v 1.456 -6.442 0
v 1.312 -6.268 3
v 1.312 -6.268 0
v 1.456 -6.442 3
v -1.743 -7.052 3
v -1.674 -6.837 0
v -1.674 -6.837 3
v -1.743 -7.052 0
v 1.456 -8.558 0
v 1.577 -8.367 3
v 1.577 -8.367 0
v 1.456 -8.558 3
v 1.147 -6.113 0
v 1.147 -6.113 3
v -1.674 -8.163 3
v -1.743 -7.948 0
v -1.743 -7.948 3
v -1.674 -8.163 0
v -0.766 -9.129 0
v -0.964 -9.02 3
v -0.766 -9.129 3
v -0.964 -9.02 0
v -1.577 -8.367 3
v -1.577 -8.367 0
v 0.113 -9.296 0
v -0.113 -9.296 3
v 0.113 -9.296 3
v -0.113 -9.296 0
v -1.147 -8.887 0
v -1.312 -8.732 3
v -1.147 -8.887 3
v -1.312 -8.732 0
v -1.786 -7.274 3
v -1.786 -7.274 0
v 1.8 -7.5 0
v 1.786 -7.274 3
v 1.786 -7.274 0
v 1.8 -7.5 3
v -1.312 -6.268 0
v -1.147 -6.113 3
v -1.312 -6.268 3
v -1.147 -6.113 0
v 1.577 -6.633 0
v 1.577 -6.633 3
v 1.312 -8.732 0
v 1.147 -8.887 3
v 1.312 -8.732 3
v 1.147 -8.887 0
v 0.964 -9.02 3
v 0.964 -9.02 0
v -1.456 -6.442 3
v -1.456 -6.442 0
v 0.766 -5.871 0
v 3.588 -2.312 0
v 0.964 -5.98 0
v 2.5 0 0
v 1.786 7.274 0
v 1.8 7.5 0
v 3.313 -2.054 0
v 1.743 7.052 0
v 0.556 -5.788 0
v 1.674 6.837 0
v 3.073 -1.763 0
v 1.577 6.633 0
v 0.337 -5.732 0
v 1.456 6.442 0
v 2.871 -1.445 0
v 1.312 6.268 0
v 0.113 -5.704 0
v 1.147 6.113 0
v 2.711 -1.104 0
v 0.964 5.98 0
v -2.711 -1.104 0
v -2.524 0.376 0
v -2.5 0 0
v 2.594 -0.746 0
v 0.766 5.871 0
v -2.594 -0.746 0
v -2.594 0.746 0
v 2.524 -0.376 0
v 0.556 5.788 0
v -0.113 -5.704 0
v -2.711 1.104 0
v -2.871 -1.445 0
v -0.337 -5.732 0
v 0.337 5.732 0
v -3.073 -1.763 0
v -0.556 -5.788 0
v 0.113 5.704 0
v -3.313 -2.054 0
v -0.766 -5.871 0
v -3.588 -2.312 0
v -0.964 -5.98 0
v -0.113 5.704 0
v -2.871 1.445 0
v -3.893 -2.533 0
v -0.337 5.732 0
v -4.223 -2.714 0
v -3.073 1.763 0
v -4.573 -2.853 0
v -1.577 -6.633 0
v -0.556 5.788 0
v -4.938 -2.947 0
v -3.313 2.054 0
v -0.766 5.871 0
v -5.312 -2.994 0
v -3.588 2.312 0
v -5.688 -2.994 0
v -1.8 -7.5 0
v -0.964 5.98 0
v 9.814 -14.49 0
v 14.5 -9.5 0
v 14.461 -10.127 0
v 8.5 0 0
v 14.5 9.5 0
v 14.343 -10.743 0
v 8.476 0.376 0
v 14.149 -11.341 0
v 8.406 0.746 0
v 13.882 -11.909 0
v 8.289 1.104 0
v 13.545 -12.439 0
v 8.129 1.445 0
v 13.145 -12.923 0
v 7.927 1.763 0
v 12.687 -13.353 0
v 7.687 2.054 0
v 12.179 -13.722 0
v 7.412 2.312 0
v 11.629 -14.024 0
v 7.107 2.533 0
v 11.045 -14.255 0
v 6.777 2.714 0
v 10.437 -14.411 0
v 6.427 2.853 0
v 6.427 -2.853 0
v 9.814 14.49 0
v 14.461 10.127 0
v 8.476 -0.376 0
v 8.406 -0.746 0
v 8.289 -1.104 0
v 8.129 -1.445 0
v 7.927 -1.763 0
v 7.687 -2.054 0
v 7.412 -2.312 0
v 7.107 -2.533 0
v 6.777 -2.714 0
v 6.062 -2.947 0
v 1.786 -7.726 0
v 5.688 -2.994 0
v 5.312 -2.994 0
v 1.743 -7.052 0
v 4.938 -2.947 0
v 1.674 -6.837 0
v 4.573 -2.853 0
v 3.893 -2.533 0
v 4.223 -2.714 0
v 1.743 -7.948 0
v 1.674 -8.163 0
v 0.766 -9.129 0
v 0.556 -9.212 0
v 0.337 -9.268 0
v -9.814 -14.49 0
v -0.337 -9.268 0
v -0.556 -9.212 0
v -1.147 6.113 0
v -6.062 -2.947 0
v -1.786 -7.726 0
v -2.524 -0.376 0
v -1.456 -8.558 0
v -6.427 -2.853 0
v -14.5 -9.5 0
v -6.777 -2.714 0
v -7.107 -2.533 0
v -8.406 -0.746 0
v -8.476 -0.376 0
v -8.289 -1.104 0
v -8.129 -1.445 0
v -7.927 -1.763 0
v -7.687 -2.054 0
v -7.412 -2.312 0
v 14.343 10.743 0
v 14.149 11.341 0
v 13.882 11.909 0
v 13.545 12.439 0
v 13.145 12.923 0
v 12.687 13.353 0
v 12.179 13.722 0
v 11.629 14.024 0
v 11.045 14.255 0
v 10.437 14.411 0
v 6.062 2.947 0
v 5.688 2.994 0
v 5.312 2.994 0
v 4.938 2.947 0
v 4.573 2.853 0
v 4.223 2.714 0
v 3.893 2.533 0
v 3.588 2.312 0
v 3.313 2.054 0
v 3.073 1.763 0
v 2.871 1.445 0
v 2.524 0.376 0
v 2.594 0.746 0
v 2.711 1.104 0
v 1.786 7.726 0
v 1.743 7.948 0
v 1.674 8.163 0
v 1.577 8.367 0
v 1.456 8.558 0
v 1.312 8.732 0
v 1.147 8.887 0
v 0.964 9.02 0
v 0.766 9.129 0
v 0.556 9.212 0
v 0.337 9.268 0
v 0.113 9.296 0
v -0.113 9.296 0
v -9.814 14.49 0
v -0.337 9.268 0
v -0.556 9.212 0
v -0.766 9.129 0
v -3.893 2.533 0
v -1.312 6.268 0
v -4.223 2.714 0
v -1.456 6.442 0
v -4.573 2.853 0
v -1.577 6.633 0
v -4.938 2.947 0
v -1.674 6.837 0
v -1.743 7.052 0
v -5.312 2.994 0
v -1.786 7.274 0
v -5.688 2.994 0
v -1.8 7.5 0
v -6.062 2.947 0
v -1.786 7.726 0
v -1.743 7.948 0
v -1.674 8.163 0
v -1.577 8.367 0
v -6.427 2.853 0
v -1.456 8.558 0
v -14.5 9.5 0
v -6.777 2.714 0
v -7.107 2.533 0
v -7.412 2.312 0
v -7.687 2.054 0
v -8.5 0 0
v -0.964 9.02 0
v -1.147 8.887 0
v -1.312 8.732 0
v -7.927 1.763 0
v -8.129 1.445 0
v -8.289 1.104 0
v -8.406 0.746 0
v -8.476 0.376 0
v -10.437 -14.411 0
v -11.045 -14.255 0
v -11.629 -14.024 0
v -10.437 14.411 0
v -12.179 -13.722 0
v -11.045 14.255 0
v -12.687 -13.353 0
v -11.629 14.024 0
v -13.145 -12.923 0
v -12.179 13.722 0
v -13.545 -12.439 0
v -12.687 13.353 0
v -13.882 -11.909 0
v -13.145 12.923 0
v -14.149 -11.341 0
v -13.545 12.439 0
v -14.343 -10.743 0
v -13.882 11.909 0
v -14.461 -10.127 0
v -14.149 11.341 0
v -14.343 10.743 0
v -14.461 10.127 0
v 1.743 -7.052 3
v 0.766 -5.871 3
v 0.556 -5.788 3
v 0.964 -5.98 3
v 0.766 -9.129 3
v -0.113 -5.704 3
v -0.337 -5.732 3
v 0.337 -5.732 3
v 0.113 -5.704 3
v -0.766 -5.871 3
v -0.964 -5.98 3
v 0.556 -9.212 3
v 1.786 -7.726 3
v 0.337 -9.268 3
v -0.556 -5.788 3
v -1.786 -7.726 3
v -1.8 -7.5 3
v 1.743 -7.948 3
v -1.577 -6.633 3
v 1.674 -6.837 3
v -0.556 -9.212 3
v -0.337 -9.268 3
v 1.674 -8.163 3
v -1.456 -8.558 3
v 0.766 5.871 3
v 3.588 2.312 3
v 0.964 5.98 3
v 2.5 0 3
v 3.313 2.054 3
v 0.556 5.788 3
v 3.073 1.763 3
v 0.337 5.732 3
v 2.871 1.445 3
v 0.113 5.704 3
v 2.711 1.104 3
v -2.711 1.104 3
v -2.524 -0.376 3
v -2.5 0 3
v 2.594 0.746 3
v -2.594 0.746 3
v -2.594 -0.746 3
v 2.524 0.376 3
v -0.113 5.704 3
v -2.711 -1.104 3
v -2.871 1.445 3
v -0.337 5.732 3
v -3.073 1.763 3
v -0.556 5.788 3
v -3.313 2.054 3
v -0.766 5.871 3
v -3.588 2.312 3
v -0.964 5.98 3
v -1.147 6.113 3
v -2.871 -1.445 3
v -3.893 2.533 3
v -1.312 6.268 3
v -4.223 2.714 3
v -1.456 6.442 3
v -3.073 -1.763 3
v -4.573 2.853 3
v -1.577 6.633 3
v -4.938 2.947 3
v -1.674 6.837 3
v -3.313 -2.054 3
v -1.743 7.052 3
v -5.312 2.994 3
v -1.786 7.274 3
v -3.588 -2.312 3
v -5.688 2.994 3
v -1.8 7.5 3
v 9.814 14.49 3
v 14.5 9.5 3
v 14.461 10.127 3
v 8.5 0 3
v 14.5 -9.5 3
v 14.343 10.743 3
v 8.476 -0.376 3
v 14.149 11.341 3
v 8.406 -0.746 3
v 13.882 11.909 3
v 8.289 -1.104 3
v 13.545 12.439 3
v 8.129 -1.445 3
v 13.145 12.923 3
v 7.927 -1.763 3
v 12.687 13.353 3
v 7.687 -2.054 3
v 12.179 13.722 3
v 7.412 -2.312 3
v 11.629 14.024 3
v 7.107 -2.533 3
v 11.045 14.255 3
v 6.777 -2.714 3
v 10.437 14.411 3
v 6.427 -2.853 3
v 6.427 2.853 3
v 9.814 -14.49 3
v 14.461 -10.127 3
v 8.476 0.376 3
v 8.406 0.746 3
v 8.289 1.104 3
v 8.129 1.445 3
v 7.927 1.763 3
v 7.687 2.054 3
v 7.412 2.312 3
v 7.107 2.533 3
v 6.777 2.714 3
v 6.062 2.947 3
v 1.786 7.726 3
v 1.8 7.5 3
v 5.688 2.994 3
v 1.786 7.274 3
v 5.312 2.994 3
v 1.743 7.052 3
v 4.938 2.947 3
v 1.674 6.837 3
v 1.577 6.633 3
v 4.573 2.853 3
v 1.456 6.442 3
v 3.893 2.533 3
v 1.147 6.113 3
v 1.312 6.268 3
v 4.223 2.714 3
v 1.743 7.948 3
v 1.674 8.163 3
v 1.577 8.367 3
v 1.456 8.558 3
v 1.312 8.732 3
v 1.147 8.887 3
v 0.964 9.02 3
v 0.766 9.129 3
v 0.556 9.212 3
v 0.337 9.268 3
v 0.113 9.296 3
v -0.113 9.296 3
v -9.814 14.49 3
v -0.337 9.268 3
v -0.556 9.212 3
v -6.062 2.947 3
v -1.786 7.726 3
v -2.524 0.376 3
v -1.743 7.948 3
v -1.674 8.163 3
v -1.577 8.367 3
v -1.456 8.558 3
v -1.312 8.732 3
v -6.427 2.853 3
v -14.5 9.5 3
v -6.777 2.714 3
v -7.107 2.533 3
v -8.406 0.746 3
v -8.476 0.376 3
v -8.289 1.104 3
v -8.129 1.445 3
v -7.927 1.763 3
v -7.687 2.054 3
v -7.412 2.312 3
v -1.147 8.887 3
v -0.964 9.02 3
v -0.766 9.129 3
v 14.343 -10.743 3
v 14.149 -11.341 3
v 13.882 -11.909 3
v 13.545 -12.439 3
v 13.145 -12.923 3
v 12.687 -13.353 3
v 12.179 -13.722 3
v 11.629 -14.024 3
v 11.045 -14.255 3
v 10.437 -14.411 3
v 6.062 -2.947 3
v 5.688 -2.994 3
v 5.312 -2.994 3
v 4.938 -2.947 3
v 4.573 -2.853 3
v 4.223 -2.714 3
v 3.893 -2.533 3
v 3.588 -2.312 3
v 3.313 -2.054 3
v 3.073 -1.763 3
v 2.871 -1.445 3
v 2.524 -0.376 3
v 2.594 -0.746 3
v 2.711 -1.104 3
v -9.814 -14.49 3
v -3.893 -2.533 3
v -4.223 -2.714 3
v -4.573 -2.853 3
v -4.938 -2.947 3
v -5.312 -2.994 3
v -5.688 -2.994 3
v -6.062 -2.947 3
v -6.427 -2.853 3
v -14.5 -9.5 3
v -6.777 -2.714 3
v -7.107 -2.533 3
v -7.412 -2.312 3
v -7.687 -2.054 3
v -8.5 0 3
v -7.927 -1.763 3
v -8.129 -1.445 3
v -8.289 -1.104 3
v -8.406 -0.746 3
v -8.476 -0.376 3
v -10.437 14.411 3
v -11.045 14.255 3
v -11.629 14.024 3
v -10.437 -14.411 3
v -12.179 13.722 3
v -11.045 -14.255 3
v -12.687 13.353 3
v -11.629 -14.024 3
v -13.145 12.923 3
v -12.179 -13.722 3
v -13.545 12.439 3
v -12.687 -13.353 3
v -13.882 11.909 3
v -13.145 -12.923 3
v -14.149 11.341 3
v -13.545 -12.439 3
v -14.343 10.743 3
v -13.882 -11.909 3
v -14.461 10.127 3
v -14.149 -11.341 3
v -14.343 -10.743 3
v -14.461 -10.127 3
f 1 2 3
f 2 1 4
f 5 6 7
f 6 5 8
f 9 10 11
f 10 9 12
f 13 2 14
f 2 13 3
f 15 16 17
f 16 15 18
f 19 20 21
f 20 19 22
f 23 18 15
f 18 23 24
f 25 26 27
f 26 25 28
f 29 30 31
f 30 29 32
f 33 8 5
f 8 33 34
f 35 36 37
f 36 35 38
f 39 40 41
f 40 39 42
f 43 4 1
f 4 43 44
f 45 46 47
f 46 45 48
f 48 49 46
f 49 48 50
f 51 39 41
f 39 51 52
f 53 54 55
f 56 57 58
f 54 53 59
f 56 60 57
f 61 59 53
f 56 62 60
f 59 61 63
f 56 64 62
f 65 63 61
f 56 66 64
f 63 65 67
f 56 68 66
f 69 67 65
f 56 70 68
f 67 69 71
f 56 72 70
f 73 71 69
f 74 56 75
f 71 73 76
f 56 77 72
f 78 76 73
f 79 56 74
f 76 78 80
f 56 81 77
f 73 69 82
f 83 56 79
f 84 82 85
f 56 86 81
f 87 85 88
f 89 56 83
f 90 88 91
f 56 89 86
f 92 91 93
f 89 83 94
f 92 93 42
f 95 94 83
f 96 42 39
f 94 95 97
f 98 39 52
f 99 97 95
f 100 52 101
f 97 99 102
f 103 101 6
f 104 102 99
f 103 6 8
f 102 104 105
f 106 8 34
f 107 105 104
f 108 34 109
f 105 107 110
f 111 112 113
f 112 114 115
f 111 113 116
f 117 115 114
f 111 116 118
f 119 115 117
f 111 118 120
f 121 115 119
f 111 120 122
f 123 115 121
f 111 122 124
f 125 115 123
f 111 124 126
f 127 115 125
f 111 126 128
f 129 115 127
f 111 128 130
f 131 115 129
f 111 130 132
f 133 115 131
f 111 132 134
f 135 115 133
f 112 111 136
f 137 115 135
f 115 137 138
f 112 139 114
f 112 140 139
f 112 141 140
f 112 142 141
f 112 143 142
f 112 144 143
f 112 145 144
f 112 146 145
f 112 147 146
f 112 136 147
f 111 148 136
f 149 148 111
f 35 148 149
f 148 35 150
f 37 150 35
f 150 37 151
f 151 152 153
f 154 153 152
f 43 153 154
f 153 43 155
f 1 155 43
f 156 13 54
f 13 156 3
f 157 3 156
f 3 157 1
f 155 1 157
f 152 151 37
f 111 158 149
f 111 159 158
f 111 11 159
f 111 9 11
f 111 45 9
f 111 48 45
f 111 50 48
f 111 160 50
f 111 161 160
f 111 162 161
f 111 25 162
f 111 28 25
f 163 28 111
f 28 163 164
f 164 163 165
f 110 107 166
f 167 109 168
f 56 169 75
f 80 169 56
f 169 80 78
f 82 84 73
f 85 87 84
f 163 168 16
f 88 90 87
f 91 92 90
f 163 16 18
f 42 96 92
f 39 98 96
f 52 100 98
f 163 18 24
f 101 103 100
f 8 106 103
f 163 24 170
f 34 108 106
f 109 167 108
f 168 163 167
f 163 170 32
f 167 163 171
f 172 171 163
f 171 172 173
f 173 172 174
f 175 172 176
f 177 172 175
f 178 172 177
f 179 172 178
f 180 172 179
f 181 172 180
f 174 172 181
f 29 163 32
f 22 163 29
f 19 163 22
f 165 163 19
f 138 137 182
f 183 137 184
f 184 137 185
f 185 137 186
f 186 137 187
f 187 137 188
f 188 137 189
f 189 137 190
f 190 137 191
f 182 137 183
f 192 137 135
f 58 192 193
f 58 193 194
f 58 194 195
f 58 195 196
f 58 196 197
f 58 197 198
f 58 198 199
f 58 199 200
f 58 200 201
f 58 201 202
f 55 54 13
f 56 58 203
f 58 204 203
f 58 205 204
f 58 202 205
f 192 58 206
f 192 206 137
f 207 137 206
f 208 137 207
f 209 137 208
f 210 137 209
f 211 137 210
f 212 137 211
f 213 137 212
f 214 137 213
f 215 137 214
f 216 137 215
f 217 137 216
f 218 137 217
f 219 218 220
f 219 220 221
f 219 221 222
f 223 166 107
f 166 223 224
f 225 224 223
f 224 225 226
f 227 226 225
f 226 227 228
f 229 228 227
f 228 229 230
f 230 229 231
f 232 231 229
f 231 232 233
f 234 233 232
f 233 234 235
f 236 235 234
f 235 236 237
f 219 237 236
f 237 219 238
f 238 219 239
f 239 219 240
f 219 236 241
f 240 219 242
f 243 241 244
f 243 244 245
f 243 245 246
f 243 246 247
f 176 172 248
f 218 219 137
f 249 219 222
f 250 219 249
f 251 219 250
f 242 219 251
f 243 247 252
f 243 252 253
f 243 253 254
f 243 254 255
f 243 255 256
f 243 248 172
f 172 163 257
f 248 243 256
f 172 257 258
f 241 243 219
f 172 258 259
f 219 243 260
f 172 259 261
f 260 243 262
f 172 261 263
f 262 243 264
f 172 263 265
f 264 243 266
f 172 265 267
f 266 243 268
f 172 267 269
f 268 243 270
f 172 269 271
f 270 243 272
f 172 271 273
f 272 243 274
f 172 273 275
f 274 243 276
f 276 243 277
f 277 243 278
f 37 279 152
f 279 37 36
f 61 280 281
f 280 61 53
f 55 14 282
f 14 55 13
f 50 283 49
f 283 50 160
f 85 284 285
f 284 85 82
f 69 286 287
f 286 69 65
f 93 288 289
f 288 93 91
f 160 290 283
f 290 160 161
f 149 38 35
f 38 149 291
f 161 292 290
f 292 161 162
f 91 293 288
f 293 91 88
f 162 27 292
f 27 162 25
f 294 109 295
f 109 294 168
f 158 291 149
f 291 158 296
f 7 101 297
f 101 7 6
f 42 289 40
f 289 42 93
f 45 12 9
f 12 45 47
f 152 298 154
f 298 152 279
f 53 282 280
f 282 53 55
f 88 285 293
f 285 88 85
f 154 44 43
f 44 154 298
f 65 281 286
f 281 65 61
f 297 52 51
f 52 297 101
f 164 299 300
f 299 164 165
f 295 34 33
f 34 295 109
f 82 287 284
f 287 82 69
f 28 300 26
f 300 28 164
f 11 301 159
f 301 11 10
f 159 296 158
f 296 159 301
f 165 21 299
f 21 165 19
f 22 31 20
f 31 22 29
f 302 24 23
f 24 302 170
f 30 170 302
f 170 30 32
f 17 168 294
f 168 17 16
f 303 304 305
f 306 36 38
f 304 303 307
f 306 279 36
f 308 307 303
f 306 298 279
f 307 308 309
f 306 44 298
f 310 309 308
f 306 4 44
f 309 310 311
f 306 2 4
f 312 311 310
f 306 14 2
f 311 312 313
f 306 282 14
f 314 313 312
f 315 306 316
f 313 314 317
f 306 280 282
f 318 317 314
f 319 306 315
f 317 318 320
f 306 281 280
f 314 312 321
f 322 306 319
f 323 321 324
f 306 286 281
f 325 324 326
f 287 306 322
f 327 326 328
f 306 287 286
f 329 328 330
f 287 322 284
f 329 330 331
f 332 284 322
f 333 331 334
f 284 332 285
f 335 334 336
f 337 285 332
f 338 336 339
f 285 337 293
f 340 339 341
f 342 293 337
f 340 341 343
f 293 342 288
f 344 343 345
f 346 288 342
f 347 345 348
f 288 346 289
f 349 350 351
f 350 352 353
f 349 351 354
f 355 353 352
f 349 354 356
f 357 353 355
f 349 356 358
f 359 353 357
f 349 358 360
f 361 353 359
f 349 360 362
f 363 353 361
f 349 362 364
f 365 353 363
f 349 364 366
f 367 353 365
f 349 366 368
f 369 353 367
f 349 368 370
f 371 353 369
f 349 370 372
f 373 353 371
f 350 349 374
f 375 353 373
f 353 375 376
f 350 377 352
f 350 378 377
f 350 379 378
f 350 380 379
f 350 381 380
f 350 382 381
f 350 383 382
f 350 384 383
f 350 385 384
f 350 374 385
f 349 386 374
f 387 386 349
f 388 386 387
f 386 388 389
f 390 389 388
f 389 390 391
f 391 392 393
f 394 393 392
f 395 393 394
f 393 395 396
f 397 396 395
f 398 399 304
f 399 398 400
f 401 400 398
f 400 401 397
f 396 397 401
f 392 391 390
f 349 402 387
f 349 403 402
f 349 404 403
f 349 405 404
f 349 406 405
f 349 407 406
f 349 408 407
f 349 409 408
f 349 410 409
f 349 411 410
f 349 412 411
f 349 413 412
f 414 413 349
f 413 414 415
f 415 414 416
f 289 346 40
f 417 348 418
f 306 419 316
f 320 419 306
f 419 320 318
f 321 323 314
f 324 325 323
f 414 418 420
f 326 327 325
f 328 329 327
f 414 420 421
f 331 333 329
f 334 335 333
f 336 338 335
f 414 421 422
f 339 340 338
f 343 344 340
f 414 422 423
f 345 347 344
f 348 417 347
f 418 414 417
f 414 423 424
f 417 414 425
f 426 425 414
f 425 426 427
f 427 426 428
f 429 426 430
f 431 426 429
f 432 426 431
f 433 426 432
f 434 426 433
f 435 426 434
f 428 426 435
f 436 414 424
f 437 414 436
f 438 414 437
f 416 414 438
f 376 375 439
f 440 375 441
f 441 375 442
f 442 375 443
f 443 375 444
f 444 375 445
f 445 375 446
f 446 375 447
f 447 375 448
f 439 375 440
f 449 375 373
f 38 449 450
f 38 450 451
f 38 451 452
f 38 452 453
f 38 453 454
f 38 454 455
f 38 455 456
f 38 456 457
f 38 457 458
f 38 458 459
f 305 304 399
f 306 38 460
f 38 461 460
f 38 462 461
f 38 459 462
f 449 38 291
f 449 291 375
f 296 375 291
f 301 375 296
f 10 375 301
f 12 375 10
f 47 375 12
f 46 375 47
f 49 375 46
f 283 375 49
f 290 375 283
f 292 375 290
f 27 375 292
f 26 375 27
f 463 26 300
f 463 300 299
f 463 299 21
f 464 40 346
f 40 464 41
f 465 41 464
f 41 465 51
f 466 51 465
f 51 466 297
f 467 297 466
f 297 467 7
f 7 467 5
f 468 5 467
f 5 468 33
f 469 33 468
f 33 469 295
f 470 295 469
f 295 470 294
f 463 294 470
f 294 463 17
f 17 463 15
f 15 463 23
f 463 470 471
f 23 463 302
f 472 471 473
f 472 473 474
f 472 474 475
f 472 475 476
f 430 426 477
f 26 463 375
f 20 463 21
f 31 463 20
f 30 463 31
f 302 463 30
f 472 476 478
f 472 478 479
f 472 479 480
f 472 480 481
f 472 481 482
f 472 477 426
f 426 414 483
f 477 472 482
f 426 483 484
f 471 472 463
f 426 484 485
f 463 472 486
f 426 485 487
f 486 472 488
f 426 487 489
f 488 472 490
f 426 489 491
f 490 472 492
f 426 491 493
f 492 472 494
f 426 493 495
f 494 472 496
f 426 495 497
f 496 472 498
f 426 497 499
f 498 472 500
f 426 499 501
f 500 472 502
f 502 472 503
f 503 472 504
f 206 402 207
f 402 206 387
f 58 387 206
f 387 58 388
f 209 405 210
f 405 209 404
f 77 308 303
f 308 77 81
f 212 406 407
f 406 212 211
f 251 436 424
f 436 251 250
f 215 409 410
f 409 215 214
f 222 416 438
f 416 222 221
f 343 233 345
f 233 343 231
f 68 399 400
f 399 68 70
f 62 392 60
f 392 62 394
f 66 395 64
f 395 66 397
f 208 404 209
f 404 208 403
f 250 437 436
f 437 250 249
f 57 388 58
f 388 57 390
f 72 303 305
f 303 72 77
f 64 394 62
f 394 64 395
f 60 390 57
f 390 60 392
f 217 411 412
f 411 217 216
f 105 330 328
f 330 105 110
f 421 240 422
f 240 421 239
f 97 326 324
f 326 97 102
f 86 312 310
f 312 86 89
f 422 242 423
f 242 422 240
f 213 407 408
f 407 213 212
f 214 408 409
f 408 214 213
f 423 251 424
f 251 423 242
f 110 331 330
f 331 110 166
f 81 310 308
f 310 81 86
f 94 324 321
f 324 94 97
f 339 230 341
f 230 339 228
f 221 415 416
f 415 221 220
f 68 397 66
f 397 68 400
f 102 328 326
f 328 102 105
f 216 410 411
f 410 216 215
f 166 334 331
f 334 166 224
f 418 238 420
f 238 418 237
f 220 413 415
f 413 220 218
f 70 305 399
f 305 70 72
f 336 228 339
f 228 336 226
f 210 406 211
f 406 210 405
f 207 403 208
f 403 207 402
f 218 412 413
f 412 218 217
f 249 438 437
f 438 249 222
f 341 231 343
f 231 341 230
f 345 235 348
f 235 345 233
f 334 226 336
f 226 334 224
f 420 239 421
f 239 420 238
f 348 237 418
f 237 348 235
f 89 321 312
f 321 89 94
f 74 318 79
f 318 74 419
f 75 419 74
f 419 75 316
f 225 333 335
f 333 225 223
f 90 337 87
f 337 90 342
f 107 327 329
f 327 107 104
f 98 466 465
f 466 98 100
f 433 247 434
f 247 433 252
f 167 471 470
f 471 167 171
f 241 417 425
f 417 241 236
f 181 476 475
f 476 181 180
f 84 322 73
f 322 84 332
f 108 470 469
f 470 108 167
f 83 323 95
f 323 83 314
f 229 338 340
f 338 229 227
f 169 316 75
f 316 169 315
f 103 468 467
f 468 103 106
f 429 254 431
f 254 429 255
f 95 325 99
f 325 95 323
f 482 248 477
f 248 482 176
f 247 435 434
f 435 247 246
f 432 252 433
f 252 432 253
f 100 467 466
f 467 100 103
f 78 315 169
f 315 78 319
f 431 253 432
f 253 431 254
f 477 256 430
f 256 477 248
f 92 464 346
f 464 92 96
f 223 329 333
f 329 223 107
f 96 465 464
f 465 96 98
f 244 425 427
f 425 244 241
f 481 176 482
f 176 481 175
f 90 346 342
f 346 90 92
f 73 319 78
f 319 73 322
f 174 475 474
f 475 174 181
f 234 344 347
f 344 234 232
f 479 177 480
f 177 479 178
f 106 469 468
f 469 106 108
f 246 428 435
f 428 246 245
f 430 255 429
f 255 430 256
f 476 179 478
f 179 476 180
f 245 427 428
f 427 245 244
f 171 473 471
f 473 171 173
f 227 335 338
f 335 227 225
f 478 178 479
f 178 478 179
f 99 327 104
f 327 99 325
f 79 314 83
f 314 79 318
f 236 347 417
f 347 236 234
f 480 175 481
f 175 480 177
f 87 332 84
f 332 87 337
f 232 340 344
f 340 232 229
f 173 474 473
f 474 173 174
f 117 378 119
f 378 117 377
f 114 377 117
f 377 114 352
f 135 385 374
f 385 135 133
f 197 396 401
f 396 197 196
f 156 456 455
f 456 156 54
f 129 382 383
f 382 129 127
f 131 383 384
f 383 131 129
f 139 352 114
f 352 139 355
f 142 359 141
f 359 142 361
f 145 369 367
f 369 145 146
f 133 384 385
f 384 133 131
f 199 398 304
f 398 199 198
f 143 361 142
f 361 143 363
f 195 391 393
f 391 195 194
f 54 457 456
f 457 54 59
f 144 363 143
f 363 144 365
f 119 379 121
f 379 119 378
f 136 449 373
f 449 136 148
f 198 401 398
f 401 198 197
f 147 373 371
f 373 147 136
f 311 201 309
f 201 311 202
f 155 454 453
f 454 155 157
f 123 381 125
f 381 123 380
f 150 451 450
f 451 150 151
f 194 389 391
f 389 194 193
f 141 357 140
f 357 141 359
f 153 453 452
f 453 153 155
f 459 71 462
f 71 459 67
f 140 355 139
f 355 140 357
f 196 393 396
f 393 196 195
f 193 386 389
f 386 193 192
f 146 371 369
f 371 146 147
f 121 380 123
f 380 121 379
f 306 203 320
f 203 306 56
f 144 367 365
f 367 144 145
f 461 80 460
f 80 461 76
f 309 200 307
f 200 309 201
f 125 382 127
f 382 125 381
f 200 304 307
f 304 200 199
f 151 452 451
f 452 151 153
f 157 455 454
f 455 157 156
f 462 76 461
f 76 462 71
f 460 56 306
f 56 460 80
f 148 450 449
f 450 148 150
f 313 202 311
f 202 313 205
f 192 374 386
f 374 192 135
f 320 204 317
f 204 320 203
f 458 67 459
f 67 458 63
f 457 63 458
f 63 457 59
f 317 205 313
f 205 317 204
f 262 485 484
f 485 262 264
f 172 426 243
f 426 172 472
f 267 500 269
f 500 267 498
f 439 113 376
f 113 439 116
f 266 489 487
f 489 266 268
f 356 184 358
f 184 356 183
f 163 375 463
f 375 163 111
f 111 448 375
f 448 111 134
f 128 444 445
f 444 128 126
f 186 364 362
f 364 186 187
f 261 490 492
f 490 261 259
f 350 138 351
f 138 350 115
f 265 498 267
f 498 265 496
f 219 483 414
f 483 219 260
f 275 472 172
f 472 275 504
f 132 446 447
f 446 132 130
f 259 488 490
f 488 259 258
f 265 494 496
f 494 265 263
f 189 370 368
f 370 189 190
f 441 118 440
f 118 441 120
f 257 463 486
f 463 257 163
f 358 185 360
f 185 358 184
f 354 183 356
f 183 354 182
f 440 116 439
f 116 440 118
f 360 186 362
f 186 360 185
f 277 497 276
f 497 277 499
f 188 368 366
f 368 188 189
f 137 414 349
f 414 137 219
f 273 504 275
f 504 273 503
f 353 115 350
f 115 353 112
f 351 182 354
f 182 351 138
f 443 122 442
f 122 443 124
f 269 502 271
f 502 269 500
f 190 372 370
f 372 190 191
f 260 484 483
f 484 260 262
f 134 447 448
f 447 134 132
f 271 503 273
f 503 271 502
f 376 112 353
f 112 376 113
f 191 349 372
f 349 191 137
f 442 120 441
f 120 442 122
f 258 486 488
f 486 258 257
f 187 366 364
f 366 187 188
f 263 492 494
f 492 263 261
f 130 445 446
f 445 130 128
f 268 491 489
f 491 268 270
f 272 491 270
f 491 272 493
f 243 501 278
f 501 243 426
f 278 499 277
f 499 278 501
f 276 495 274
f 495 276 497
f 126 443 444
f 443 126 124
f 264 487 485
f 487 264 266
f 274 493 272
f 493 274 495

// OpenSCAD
$fn = 50;

difference() {
	union() {
		hull() {
			translate(v = [-9.5, 9.5, 0]) {
				cylinder(h = 3, r = 5);
			}
			translate(v = [9.5, 9.5, 0]) {
				cylinder(h = 3, r = 5);
			}
			translate(v = [-9.5, -9.5, 0]) {
				cylinder(h = 3, r = 5);
			}
			translate(v = [9.5, -9.5, 0]) {
				cylinder(h = 3, r = 5);
			}
		}
	}
	union() {
		translate(v = [0.0, -7.5, 0]) {
			cylinder(h = 3, r = 1.8);
		}
		translate(v = [0.0, 7.5, 0]) {
			cylinder(h = 3, r = 1.8);
		}
		translate(v = [-5.5, 0, 0.0]) {
			cylinder(h = 3, r = 3.0);
		}
		translate(v = [5.5, 0, 0.0]) {
			cylinder(h = 3, r = 3.0);
		}
	}
}
